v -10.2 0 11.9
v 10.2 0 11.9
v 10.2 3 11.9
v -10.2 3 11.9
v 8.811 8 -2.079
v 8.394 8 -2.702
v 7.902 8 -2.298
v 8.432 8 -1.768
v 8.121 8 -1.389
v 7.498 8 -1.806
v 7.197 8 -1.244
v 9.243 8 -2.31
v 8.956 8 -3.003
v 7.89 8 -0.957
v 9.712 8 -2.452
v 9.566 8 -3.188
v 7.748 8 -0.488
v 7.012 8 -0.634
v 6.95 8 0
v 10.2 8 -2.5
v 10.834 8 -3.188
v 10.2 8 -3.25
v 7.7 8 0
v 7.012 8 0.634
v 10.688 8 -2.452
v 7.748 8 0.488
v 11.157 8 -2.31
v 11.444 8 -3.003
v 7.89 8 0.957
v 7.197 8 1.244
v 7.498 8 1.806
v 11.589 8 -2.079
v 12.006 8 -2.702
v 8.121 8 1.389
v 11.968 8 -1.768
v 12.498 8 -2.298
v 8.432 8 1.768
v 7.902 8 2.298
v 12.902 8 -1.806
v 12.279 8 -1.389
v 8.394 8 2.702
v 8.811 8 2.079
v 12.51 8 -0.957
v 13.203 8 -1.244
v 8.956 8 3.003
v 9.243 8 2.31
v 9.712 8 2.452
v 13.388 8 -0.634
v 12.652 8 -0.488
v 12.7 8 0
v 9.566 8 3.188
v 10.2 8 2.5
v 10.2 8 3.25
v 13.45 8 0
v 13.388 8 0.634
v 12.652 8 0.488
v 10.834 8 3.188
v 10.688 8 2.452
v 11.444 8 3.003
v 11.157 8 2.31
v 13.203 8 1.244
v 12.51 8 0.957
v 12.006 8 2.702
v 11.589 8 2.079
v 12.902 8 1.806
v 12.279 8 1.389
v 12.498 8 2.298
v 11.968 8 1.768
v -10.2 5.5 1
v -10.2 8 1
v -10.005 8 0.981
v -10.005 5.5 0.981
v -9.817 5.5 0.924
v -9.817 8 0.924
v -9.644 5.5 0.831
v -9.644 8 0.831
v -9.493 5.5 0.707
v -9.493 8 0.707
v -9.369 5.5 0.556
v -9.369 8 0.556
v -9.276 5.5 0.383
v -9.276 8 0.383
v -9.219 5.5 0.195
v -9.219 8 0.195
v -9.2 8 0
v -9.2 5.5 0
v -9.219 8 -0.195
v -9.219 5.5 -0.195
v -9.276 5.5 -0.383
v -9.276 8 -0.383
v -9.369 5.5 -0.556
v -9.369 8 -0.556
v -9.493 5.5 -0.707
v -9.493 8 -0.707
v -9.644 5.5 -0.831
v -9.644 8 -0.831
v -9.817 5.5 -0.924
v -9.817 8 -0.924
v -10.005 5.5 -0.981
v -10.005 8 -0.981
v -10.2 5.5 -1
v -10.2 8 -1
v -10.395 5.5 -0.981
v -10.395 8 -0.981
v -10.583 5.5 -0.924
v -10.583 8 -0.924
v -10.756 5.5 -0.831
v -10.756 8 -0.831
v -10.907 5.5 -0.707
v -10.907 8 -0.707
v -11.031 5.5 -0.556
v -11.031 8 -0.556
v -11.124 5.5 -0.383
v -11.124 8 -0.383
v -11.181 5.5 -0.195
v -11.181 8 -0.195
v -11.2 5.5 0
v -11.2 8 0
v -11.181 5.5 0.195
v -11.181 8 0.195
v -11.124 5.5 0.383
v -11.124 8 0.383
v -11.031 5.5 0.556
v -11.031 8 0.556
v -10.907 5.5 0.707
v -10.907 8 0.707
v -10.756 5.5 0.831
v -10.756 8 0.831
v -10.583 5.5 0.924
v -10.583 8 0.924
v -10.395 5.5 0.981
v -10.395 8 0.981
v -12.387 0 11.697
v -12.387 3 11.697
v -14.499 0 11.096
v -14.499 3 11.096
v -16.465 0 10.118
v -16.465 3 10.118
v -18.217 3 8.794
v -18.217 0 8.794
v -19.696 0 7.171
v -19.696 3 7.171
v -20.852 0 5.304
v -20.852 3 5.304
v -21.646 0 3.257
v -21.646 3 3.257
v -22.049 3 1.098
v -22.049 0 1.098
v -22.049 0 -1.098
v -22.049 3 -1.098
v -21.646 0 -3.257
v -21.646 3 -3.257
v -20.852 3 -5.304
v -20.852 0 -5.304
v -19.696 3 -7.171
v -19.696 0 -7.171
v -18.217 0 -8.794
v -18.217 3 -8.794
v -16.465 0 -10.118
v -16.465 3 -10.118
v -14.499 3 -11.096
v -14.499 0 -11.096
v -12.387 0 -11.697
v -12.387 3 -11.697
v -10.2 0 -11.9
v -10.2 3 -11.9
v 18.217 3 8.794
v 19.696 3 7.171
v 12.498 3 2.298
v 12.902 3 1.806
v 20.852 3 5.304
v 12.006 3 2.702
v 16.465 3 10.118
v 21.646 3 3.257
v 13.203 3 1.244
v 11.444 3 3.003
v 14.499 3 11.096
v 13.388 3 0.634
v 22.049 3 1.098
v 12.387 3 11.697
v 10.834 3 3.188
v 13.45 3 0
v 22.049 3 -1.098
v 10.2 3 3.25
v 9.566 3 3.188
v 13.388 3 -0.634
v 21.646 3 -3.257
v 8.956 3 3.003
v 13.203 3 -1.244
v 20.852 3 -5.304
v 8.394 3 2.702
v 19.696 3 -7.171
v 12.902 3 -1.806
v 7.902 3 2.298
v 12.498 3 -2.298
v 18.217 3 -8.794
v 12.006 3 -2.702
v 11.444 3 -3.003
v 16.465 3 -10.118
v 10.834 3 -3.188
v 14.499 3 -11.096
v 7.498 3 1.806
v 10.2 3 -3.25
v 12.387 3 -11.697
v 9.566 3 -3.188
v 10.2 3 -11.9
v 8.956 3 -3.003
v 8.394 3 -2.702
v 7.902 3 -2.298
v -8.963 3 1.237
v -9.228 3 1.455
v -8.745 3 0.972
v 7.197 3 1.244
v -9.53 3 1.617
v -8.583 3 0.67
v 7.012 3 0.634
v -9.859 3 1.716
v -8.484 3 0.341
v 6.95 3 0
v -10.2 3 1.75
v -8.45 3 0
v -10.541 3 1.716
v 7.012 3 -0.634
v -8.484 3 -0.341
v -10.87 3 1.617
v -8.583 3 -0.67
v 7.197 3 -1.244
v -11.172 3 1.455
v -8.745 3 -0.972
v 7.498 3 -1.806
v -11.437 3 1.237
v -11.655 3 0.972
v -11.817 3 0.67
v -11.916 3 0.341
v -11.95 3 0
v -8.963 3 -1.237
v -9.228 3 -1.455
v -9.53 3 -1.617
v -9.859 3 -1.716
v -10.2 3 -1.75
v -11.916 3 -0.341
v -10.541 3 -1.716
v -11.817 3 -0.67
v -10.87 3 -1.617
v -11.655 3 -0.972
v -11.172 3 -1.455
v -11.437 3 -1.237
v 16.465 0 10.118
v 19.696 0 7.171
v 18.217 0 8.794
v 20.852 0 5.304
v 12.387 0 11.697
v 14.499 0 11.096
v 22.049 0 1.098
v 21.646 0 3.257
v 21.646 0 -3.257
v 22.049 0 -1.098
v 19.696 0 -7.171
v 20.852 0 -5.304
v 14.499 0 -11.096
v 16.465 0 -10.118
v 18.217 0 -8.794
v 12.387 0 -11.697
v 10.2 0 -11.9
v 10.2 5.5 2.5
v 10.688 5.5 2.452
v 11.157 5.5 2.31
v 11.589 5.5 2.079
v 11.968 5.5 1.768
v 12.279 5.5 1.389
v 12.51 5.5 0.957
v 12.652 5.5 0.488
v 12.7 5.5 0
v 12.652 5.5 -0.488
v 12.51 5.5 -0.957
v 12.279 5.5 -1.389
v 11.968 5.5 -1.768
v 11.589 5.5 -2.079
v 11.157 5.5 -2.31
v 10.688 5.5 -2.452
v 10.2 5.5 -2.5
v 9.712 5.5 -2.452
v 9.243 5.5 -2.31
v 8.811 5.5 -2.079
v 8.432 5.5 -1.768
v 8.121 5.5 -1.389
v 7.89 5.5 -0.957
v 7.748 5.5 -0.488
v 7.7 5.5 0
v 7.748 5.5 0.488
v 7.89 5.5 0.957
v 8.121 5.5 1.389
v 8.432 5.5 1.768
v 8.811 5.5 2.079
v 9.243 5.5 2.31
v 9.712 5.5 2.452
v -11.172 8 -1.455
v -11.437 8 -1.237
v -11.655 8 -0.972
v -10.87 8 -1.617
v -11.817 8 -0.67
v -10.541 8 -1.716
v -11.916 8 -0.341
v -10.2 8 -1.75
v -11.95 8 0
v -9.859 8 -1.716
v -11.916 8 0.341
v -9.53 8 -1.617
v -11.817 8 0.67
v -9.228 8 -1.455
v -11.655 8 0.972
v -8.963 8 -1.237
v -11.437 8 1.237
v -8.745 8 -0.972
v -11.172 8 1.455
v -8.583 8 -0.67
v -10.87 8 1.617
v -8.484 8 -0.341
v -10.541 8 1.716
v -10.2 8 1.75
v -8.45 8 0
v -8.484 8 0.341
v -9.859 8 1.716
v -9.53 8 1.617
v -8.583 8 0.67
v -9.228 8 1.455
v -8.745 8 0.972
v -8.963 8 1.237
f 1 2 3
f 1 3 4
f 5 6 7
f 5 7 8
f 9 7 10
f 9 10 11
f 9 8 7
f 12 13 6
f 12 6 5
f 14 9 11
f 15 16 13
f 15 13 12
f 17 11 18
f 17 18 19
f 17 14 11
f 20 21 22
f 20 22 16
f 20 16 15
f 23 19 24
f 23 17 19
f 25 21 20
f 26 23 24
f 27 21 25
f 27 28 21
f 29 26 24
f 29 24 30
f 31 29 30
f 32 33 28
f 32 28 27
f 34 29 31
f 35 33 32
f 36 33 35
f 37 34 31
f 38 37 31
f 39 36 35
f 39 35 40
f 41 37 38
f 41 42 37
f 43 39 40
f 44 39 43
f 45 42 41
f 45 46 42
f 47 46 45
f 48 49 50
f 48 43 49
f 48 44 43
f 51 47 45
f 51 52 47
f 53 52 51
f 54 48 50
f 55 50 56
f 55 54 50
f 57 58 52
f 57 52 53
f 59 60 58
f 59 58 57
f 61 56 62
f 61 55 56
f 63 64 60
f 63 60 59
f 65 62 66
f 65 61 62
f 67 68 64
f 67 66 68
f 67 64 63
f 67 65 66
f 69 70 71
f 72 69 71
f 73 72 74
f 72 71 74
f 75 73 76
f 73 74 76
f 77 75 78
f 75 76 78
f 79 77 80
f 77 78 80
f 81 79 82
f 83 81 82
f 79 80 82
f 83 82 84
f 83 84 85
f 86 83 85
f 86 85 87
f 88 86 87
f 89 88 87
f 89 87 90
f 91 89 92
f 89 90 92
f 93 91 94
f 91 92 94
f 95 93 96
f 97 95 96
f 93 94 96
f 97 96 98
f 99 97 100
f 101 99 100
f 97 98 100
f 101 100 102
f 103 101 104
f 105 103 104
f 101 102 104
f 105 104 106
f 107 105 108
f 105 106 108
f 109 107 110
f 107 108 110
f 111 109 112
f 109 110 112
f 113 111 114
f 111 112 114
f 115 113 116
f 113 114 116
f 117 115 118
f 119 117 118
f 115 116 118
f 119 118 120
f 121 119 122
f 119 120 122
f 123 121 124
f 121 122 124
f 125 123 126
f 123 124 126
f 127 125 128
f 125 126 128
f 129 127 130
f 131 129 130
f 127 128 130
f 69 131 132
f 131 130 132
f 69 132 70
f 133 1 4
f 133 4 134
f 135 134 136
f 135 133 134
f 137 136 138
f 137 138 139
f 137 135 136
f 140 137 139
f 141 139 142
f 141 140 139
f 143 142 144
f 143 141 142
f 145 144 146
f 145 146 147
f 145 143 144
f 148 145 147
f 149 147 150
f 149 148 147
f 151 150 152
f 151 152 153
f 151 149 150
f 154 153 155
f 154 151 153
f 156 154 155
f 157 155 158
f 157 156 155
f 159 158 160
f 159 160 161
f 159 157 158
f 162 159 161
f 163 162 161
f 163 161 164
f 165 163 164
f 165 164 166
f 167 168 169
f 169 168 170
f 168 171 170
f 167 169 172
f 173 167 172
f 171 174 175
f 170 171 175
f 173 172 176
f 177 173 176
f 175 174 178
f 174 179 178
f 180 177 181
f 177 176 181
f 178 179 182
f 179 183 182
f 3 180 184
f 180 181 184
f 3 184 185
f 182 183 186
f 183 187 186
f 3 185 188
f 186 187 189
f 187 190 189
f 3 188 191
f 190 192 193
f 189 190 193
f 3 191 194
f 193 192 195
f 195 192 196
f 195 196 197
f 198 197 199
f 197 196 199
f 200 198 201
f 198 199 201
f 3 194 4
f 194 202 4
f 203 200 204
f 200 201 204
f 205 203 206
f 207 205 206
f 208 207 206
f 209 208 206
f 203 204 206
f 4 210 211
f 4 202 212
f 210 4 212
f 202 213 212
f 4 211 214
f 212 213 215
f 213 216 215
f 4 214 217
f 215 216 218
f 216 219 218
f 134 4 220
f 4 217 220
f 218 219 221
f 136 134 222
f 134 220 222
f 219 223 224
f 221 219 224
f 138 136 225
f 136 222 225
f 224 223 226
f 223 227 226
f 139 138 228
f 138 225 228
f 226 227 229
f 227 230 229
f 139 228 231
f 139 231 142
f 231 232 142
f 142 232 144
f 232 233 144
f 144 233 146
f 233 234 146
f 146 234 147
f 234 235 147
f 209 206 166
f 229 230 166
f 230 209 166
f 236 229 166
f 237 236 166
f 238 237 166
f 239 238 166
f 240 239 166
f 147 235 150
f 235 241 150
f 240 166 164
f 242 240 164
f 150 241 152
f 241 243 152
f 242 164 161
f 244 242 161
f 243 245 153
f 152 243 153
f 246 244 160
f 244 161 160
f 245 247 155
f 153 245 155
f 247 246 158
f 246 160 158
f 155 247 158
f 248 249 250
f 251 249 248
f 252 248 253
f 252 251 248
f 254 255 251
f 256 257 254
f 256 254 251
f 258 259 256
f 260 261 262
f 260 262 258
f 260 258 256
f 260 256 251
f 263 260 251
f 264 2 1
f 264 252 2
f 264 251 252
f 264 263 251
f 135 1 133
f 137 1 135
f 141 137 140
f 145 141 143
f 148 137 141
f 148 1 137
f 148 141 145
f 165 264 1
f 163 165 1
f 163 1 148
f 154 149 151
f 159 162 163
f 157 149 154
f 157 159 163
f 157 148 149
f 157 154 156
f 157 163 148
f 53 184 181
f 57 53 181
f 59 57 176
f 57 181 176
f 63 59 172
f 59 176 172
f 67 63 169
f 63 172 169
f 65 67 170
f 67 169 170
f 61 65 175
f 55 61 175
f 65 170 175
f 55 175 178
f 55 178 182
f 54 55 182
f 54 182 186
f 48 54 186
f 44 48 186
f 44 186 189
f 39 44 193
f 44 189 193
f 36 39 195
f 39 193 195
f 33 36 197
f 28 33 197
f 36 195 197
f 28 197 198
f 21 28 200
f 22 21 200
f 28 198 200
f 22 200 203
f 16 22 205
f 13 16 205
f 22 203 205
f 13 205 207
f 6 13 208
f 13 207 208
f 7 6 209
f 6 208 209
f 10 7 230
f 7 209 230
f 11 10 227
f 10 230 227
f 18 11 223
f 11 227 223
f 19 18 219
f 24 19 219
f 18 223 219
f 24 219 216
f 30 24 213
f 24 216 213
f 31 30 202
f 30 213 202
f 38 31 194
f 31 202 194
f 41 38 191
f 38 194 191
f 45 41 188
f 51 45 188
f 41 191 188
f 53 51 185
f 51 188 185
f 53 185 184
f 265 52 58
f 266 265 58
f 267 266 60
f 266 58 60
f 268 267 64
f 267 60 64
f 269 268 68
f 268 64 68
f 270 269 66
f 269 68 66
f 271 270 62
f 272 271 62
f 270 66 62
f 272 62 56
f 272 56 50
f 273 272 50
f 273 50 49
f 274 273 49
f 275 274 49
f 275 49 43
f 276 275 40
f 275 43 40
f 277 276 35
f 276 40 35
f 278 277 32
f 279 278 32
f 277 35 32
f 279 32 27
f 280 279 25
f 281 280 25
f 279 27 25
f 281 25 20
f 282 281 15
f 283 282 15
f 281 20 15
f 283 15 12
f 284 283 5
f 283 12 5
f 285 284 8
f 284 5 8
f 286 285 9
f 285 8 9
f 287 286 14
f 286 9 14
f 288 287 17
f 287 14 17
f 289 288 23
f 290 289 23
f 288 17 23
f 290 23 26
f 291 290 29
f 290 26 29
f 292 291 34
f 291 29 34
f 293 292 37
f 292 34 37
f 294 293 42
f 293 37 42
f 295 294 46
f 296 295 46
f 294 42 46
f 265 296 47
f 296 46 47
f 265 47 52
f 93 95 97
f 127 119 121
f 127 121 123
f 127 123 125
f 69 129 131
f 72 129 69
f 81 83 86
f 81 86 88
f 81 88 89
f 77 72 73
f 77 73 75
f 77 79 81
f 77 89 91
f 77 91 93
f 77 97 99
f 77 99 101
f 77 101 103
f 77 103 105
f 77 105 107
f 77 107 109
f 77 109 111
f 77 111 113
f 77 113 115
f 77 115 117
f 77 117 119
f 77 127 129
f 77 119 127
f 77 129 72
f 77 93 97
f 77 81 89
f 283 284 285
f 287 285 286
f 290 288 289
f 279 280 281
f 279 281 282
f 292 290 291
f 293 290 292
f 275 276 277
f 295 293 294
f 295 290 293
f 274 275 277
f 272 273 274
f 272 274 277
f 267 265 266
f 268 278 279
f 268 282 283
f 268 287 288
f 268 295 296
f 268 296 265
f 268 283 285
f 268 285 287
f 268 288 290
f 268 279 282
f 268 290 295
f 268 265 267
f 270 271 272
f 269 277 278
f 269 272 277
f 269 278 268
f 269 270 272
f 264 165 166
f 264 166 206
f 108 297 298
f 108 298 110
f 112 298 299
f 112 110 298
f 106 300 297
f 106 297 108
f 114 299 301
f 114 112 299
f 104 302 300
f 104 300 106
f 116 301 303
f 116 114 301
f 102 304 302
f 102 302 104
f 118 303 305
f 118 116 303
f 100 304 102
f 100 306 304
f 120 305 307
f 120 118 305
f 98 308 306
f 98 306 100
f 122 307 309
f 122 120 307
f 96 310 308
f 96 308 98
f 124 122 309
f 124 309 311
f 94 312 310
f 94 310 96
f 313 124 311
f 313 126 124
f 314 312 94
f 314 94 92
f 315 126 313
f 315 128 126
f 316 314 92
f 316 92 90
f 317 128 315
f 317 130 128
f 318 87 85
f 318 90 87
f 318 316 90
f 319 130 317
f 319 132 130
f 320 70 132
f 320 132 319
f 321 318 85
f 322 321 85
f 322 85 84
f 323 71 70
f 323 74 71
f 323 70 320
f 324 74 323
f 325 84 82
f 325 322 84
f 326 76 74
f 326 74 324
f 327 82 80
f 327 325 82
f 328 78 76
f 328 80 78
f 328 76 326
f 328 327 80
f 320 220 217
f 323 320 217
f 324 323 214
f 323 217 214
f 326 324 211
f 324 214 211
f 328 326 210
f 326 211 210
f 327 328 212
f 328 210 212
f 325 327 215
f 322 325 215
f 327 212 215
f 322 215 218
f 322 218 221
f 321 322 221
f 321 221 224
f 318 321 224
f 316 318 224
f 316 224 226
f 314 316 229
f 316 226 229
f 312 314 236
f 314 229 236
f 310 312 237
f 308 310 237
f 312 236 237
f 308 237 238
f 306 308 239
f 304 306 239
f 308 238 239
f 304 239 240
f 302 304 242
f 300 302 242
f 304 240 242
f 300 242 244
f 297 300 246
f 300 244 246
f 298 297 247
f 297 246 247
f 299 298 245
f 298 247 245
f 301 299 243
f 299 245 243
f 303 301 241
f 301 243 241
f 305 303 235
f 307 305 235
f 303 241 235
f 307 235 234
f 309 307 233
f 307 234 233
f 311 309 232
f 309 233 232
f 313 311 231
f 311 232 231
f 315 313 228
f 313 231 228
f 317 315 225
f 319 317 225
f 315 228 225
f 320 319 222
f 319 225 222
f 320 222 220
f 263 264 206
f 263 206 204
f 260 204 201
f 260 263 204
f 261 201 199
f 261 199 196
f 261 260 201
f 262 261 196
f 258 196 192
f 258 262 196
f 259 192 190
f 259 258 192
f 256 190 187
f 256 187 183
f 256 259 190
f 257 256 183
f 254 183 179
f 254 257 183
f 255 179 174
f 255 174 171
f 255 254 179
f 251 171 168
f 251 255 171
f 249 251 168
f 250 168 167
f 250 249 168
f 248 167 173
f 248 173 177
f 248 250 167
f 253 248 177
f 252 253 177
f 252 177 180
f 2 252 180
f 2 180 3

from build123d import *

# Parameters (mm, degrees)
BOSS_EXTRU_1_DEPTH      = 3
ESQUISSE2_R             = 1.75
ESQUISSE2_R_2           = 3.25
BOSS_EXTRU_2_DEPTH      = 5
ESQUISSE3_R             = 1
ESQUISSE3_R_2           = 2.5
ENL_V_MAT_EXTRU_1_DEPTH = 2.5


with BuildPart() as part:
    # Esquisse1 → Boss.-Extru.1 (new body)
    with BuildSketch(Plane(origin=(0, 0, 0), x_dir=(1, 0, 0), z_dir=(0, 1, 0))):
        with BuildLine():
            Line((10.2, -11.9), (-10.2, -11.9))
            ThreePointArc((-10.2, -11.9), (-22.1, 0), (-10.2, 11.9))
            Line((-10.2, 11.9), (10.2, 11.9))
            ThreePointArc((10.2, 11.9), (22.1, 0), (10.2, -11.9))
        make_face()
    extrude(amount=BOSS_EXTRU_1_DEPTH)

    # Esquisse2 → Boss.-Extru.2 (add)
    with BuildSketch(Plane(origin=(0, 3, 0), x_dir=(1, 0, 0), z_dir=(0, 1, 0))):
        with Locations(Location((-10.2, 0, 0), (0, 0, 270))):
            Circle(ESQUISSE2_R)
        with Locations(Location((10.2, 0, 0), (0, 0, 270))):
            Circle(ESQUISSE2_R_2)
    extrude(amount=BOSS_EXTRU_2_DEPTH)

    # Esquisse3 → Enlèv. mat.-Extru.1 (cut)
    with BuildSketch(Plane(origin=(0, 8, 0), x_dir=(1, 0, 0), z_dir=(0, 1, 0))):
        with Locations(Location((-10.2, 0, 0), (0, 0, 270))):
            Circle(ESQUISSE3_R)
        with Locations(Location((10.2, 0, 0), (0, 0, 270))):
            Circle(ESQUISSE3_R_2)
    extrude(amount=-ENL_V_MAT_EXTRU_1_DEPTH, mode=Mode.SUBTRACT)


solid = part.part
